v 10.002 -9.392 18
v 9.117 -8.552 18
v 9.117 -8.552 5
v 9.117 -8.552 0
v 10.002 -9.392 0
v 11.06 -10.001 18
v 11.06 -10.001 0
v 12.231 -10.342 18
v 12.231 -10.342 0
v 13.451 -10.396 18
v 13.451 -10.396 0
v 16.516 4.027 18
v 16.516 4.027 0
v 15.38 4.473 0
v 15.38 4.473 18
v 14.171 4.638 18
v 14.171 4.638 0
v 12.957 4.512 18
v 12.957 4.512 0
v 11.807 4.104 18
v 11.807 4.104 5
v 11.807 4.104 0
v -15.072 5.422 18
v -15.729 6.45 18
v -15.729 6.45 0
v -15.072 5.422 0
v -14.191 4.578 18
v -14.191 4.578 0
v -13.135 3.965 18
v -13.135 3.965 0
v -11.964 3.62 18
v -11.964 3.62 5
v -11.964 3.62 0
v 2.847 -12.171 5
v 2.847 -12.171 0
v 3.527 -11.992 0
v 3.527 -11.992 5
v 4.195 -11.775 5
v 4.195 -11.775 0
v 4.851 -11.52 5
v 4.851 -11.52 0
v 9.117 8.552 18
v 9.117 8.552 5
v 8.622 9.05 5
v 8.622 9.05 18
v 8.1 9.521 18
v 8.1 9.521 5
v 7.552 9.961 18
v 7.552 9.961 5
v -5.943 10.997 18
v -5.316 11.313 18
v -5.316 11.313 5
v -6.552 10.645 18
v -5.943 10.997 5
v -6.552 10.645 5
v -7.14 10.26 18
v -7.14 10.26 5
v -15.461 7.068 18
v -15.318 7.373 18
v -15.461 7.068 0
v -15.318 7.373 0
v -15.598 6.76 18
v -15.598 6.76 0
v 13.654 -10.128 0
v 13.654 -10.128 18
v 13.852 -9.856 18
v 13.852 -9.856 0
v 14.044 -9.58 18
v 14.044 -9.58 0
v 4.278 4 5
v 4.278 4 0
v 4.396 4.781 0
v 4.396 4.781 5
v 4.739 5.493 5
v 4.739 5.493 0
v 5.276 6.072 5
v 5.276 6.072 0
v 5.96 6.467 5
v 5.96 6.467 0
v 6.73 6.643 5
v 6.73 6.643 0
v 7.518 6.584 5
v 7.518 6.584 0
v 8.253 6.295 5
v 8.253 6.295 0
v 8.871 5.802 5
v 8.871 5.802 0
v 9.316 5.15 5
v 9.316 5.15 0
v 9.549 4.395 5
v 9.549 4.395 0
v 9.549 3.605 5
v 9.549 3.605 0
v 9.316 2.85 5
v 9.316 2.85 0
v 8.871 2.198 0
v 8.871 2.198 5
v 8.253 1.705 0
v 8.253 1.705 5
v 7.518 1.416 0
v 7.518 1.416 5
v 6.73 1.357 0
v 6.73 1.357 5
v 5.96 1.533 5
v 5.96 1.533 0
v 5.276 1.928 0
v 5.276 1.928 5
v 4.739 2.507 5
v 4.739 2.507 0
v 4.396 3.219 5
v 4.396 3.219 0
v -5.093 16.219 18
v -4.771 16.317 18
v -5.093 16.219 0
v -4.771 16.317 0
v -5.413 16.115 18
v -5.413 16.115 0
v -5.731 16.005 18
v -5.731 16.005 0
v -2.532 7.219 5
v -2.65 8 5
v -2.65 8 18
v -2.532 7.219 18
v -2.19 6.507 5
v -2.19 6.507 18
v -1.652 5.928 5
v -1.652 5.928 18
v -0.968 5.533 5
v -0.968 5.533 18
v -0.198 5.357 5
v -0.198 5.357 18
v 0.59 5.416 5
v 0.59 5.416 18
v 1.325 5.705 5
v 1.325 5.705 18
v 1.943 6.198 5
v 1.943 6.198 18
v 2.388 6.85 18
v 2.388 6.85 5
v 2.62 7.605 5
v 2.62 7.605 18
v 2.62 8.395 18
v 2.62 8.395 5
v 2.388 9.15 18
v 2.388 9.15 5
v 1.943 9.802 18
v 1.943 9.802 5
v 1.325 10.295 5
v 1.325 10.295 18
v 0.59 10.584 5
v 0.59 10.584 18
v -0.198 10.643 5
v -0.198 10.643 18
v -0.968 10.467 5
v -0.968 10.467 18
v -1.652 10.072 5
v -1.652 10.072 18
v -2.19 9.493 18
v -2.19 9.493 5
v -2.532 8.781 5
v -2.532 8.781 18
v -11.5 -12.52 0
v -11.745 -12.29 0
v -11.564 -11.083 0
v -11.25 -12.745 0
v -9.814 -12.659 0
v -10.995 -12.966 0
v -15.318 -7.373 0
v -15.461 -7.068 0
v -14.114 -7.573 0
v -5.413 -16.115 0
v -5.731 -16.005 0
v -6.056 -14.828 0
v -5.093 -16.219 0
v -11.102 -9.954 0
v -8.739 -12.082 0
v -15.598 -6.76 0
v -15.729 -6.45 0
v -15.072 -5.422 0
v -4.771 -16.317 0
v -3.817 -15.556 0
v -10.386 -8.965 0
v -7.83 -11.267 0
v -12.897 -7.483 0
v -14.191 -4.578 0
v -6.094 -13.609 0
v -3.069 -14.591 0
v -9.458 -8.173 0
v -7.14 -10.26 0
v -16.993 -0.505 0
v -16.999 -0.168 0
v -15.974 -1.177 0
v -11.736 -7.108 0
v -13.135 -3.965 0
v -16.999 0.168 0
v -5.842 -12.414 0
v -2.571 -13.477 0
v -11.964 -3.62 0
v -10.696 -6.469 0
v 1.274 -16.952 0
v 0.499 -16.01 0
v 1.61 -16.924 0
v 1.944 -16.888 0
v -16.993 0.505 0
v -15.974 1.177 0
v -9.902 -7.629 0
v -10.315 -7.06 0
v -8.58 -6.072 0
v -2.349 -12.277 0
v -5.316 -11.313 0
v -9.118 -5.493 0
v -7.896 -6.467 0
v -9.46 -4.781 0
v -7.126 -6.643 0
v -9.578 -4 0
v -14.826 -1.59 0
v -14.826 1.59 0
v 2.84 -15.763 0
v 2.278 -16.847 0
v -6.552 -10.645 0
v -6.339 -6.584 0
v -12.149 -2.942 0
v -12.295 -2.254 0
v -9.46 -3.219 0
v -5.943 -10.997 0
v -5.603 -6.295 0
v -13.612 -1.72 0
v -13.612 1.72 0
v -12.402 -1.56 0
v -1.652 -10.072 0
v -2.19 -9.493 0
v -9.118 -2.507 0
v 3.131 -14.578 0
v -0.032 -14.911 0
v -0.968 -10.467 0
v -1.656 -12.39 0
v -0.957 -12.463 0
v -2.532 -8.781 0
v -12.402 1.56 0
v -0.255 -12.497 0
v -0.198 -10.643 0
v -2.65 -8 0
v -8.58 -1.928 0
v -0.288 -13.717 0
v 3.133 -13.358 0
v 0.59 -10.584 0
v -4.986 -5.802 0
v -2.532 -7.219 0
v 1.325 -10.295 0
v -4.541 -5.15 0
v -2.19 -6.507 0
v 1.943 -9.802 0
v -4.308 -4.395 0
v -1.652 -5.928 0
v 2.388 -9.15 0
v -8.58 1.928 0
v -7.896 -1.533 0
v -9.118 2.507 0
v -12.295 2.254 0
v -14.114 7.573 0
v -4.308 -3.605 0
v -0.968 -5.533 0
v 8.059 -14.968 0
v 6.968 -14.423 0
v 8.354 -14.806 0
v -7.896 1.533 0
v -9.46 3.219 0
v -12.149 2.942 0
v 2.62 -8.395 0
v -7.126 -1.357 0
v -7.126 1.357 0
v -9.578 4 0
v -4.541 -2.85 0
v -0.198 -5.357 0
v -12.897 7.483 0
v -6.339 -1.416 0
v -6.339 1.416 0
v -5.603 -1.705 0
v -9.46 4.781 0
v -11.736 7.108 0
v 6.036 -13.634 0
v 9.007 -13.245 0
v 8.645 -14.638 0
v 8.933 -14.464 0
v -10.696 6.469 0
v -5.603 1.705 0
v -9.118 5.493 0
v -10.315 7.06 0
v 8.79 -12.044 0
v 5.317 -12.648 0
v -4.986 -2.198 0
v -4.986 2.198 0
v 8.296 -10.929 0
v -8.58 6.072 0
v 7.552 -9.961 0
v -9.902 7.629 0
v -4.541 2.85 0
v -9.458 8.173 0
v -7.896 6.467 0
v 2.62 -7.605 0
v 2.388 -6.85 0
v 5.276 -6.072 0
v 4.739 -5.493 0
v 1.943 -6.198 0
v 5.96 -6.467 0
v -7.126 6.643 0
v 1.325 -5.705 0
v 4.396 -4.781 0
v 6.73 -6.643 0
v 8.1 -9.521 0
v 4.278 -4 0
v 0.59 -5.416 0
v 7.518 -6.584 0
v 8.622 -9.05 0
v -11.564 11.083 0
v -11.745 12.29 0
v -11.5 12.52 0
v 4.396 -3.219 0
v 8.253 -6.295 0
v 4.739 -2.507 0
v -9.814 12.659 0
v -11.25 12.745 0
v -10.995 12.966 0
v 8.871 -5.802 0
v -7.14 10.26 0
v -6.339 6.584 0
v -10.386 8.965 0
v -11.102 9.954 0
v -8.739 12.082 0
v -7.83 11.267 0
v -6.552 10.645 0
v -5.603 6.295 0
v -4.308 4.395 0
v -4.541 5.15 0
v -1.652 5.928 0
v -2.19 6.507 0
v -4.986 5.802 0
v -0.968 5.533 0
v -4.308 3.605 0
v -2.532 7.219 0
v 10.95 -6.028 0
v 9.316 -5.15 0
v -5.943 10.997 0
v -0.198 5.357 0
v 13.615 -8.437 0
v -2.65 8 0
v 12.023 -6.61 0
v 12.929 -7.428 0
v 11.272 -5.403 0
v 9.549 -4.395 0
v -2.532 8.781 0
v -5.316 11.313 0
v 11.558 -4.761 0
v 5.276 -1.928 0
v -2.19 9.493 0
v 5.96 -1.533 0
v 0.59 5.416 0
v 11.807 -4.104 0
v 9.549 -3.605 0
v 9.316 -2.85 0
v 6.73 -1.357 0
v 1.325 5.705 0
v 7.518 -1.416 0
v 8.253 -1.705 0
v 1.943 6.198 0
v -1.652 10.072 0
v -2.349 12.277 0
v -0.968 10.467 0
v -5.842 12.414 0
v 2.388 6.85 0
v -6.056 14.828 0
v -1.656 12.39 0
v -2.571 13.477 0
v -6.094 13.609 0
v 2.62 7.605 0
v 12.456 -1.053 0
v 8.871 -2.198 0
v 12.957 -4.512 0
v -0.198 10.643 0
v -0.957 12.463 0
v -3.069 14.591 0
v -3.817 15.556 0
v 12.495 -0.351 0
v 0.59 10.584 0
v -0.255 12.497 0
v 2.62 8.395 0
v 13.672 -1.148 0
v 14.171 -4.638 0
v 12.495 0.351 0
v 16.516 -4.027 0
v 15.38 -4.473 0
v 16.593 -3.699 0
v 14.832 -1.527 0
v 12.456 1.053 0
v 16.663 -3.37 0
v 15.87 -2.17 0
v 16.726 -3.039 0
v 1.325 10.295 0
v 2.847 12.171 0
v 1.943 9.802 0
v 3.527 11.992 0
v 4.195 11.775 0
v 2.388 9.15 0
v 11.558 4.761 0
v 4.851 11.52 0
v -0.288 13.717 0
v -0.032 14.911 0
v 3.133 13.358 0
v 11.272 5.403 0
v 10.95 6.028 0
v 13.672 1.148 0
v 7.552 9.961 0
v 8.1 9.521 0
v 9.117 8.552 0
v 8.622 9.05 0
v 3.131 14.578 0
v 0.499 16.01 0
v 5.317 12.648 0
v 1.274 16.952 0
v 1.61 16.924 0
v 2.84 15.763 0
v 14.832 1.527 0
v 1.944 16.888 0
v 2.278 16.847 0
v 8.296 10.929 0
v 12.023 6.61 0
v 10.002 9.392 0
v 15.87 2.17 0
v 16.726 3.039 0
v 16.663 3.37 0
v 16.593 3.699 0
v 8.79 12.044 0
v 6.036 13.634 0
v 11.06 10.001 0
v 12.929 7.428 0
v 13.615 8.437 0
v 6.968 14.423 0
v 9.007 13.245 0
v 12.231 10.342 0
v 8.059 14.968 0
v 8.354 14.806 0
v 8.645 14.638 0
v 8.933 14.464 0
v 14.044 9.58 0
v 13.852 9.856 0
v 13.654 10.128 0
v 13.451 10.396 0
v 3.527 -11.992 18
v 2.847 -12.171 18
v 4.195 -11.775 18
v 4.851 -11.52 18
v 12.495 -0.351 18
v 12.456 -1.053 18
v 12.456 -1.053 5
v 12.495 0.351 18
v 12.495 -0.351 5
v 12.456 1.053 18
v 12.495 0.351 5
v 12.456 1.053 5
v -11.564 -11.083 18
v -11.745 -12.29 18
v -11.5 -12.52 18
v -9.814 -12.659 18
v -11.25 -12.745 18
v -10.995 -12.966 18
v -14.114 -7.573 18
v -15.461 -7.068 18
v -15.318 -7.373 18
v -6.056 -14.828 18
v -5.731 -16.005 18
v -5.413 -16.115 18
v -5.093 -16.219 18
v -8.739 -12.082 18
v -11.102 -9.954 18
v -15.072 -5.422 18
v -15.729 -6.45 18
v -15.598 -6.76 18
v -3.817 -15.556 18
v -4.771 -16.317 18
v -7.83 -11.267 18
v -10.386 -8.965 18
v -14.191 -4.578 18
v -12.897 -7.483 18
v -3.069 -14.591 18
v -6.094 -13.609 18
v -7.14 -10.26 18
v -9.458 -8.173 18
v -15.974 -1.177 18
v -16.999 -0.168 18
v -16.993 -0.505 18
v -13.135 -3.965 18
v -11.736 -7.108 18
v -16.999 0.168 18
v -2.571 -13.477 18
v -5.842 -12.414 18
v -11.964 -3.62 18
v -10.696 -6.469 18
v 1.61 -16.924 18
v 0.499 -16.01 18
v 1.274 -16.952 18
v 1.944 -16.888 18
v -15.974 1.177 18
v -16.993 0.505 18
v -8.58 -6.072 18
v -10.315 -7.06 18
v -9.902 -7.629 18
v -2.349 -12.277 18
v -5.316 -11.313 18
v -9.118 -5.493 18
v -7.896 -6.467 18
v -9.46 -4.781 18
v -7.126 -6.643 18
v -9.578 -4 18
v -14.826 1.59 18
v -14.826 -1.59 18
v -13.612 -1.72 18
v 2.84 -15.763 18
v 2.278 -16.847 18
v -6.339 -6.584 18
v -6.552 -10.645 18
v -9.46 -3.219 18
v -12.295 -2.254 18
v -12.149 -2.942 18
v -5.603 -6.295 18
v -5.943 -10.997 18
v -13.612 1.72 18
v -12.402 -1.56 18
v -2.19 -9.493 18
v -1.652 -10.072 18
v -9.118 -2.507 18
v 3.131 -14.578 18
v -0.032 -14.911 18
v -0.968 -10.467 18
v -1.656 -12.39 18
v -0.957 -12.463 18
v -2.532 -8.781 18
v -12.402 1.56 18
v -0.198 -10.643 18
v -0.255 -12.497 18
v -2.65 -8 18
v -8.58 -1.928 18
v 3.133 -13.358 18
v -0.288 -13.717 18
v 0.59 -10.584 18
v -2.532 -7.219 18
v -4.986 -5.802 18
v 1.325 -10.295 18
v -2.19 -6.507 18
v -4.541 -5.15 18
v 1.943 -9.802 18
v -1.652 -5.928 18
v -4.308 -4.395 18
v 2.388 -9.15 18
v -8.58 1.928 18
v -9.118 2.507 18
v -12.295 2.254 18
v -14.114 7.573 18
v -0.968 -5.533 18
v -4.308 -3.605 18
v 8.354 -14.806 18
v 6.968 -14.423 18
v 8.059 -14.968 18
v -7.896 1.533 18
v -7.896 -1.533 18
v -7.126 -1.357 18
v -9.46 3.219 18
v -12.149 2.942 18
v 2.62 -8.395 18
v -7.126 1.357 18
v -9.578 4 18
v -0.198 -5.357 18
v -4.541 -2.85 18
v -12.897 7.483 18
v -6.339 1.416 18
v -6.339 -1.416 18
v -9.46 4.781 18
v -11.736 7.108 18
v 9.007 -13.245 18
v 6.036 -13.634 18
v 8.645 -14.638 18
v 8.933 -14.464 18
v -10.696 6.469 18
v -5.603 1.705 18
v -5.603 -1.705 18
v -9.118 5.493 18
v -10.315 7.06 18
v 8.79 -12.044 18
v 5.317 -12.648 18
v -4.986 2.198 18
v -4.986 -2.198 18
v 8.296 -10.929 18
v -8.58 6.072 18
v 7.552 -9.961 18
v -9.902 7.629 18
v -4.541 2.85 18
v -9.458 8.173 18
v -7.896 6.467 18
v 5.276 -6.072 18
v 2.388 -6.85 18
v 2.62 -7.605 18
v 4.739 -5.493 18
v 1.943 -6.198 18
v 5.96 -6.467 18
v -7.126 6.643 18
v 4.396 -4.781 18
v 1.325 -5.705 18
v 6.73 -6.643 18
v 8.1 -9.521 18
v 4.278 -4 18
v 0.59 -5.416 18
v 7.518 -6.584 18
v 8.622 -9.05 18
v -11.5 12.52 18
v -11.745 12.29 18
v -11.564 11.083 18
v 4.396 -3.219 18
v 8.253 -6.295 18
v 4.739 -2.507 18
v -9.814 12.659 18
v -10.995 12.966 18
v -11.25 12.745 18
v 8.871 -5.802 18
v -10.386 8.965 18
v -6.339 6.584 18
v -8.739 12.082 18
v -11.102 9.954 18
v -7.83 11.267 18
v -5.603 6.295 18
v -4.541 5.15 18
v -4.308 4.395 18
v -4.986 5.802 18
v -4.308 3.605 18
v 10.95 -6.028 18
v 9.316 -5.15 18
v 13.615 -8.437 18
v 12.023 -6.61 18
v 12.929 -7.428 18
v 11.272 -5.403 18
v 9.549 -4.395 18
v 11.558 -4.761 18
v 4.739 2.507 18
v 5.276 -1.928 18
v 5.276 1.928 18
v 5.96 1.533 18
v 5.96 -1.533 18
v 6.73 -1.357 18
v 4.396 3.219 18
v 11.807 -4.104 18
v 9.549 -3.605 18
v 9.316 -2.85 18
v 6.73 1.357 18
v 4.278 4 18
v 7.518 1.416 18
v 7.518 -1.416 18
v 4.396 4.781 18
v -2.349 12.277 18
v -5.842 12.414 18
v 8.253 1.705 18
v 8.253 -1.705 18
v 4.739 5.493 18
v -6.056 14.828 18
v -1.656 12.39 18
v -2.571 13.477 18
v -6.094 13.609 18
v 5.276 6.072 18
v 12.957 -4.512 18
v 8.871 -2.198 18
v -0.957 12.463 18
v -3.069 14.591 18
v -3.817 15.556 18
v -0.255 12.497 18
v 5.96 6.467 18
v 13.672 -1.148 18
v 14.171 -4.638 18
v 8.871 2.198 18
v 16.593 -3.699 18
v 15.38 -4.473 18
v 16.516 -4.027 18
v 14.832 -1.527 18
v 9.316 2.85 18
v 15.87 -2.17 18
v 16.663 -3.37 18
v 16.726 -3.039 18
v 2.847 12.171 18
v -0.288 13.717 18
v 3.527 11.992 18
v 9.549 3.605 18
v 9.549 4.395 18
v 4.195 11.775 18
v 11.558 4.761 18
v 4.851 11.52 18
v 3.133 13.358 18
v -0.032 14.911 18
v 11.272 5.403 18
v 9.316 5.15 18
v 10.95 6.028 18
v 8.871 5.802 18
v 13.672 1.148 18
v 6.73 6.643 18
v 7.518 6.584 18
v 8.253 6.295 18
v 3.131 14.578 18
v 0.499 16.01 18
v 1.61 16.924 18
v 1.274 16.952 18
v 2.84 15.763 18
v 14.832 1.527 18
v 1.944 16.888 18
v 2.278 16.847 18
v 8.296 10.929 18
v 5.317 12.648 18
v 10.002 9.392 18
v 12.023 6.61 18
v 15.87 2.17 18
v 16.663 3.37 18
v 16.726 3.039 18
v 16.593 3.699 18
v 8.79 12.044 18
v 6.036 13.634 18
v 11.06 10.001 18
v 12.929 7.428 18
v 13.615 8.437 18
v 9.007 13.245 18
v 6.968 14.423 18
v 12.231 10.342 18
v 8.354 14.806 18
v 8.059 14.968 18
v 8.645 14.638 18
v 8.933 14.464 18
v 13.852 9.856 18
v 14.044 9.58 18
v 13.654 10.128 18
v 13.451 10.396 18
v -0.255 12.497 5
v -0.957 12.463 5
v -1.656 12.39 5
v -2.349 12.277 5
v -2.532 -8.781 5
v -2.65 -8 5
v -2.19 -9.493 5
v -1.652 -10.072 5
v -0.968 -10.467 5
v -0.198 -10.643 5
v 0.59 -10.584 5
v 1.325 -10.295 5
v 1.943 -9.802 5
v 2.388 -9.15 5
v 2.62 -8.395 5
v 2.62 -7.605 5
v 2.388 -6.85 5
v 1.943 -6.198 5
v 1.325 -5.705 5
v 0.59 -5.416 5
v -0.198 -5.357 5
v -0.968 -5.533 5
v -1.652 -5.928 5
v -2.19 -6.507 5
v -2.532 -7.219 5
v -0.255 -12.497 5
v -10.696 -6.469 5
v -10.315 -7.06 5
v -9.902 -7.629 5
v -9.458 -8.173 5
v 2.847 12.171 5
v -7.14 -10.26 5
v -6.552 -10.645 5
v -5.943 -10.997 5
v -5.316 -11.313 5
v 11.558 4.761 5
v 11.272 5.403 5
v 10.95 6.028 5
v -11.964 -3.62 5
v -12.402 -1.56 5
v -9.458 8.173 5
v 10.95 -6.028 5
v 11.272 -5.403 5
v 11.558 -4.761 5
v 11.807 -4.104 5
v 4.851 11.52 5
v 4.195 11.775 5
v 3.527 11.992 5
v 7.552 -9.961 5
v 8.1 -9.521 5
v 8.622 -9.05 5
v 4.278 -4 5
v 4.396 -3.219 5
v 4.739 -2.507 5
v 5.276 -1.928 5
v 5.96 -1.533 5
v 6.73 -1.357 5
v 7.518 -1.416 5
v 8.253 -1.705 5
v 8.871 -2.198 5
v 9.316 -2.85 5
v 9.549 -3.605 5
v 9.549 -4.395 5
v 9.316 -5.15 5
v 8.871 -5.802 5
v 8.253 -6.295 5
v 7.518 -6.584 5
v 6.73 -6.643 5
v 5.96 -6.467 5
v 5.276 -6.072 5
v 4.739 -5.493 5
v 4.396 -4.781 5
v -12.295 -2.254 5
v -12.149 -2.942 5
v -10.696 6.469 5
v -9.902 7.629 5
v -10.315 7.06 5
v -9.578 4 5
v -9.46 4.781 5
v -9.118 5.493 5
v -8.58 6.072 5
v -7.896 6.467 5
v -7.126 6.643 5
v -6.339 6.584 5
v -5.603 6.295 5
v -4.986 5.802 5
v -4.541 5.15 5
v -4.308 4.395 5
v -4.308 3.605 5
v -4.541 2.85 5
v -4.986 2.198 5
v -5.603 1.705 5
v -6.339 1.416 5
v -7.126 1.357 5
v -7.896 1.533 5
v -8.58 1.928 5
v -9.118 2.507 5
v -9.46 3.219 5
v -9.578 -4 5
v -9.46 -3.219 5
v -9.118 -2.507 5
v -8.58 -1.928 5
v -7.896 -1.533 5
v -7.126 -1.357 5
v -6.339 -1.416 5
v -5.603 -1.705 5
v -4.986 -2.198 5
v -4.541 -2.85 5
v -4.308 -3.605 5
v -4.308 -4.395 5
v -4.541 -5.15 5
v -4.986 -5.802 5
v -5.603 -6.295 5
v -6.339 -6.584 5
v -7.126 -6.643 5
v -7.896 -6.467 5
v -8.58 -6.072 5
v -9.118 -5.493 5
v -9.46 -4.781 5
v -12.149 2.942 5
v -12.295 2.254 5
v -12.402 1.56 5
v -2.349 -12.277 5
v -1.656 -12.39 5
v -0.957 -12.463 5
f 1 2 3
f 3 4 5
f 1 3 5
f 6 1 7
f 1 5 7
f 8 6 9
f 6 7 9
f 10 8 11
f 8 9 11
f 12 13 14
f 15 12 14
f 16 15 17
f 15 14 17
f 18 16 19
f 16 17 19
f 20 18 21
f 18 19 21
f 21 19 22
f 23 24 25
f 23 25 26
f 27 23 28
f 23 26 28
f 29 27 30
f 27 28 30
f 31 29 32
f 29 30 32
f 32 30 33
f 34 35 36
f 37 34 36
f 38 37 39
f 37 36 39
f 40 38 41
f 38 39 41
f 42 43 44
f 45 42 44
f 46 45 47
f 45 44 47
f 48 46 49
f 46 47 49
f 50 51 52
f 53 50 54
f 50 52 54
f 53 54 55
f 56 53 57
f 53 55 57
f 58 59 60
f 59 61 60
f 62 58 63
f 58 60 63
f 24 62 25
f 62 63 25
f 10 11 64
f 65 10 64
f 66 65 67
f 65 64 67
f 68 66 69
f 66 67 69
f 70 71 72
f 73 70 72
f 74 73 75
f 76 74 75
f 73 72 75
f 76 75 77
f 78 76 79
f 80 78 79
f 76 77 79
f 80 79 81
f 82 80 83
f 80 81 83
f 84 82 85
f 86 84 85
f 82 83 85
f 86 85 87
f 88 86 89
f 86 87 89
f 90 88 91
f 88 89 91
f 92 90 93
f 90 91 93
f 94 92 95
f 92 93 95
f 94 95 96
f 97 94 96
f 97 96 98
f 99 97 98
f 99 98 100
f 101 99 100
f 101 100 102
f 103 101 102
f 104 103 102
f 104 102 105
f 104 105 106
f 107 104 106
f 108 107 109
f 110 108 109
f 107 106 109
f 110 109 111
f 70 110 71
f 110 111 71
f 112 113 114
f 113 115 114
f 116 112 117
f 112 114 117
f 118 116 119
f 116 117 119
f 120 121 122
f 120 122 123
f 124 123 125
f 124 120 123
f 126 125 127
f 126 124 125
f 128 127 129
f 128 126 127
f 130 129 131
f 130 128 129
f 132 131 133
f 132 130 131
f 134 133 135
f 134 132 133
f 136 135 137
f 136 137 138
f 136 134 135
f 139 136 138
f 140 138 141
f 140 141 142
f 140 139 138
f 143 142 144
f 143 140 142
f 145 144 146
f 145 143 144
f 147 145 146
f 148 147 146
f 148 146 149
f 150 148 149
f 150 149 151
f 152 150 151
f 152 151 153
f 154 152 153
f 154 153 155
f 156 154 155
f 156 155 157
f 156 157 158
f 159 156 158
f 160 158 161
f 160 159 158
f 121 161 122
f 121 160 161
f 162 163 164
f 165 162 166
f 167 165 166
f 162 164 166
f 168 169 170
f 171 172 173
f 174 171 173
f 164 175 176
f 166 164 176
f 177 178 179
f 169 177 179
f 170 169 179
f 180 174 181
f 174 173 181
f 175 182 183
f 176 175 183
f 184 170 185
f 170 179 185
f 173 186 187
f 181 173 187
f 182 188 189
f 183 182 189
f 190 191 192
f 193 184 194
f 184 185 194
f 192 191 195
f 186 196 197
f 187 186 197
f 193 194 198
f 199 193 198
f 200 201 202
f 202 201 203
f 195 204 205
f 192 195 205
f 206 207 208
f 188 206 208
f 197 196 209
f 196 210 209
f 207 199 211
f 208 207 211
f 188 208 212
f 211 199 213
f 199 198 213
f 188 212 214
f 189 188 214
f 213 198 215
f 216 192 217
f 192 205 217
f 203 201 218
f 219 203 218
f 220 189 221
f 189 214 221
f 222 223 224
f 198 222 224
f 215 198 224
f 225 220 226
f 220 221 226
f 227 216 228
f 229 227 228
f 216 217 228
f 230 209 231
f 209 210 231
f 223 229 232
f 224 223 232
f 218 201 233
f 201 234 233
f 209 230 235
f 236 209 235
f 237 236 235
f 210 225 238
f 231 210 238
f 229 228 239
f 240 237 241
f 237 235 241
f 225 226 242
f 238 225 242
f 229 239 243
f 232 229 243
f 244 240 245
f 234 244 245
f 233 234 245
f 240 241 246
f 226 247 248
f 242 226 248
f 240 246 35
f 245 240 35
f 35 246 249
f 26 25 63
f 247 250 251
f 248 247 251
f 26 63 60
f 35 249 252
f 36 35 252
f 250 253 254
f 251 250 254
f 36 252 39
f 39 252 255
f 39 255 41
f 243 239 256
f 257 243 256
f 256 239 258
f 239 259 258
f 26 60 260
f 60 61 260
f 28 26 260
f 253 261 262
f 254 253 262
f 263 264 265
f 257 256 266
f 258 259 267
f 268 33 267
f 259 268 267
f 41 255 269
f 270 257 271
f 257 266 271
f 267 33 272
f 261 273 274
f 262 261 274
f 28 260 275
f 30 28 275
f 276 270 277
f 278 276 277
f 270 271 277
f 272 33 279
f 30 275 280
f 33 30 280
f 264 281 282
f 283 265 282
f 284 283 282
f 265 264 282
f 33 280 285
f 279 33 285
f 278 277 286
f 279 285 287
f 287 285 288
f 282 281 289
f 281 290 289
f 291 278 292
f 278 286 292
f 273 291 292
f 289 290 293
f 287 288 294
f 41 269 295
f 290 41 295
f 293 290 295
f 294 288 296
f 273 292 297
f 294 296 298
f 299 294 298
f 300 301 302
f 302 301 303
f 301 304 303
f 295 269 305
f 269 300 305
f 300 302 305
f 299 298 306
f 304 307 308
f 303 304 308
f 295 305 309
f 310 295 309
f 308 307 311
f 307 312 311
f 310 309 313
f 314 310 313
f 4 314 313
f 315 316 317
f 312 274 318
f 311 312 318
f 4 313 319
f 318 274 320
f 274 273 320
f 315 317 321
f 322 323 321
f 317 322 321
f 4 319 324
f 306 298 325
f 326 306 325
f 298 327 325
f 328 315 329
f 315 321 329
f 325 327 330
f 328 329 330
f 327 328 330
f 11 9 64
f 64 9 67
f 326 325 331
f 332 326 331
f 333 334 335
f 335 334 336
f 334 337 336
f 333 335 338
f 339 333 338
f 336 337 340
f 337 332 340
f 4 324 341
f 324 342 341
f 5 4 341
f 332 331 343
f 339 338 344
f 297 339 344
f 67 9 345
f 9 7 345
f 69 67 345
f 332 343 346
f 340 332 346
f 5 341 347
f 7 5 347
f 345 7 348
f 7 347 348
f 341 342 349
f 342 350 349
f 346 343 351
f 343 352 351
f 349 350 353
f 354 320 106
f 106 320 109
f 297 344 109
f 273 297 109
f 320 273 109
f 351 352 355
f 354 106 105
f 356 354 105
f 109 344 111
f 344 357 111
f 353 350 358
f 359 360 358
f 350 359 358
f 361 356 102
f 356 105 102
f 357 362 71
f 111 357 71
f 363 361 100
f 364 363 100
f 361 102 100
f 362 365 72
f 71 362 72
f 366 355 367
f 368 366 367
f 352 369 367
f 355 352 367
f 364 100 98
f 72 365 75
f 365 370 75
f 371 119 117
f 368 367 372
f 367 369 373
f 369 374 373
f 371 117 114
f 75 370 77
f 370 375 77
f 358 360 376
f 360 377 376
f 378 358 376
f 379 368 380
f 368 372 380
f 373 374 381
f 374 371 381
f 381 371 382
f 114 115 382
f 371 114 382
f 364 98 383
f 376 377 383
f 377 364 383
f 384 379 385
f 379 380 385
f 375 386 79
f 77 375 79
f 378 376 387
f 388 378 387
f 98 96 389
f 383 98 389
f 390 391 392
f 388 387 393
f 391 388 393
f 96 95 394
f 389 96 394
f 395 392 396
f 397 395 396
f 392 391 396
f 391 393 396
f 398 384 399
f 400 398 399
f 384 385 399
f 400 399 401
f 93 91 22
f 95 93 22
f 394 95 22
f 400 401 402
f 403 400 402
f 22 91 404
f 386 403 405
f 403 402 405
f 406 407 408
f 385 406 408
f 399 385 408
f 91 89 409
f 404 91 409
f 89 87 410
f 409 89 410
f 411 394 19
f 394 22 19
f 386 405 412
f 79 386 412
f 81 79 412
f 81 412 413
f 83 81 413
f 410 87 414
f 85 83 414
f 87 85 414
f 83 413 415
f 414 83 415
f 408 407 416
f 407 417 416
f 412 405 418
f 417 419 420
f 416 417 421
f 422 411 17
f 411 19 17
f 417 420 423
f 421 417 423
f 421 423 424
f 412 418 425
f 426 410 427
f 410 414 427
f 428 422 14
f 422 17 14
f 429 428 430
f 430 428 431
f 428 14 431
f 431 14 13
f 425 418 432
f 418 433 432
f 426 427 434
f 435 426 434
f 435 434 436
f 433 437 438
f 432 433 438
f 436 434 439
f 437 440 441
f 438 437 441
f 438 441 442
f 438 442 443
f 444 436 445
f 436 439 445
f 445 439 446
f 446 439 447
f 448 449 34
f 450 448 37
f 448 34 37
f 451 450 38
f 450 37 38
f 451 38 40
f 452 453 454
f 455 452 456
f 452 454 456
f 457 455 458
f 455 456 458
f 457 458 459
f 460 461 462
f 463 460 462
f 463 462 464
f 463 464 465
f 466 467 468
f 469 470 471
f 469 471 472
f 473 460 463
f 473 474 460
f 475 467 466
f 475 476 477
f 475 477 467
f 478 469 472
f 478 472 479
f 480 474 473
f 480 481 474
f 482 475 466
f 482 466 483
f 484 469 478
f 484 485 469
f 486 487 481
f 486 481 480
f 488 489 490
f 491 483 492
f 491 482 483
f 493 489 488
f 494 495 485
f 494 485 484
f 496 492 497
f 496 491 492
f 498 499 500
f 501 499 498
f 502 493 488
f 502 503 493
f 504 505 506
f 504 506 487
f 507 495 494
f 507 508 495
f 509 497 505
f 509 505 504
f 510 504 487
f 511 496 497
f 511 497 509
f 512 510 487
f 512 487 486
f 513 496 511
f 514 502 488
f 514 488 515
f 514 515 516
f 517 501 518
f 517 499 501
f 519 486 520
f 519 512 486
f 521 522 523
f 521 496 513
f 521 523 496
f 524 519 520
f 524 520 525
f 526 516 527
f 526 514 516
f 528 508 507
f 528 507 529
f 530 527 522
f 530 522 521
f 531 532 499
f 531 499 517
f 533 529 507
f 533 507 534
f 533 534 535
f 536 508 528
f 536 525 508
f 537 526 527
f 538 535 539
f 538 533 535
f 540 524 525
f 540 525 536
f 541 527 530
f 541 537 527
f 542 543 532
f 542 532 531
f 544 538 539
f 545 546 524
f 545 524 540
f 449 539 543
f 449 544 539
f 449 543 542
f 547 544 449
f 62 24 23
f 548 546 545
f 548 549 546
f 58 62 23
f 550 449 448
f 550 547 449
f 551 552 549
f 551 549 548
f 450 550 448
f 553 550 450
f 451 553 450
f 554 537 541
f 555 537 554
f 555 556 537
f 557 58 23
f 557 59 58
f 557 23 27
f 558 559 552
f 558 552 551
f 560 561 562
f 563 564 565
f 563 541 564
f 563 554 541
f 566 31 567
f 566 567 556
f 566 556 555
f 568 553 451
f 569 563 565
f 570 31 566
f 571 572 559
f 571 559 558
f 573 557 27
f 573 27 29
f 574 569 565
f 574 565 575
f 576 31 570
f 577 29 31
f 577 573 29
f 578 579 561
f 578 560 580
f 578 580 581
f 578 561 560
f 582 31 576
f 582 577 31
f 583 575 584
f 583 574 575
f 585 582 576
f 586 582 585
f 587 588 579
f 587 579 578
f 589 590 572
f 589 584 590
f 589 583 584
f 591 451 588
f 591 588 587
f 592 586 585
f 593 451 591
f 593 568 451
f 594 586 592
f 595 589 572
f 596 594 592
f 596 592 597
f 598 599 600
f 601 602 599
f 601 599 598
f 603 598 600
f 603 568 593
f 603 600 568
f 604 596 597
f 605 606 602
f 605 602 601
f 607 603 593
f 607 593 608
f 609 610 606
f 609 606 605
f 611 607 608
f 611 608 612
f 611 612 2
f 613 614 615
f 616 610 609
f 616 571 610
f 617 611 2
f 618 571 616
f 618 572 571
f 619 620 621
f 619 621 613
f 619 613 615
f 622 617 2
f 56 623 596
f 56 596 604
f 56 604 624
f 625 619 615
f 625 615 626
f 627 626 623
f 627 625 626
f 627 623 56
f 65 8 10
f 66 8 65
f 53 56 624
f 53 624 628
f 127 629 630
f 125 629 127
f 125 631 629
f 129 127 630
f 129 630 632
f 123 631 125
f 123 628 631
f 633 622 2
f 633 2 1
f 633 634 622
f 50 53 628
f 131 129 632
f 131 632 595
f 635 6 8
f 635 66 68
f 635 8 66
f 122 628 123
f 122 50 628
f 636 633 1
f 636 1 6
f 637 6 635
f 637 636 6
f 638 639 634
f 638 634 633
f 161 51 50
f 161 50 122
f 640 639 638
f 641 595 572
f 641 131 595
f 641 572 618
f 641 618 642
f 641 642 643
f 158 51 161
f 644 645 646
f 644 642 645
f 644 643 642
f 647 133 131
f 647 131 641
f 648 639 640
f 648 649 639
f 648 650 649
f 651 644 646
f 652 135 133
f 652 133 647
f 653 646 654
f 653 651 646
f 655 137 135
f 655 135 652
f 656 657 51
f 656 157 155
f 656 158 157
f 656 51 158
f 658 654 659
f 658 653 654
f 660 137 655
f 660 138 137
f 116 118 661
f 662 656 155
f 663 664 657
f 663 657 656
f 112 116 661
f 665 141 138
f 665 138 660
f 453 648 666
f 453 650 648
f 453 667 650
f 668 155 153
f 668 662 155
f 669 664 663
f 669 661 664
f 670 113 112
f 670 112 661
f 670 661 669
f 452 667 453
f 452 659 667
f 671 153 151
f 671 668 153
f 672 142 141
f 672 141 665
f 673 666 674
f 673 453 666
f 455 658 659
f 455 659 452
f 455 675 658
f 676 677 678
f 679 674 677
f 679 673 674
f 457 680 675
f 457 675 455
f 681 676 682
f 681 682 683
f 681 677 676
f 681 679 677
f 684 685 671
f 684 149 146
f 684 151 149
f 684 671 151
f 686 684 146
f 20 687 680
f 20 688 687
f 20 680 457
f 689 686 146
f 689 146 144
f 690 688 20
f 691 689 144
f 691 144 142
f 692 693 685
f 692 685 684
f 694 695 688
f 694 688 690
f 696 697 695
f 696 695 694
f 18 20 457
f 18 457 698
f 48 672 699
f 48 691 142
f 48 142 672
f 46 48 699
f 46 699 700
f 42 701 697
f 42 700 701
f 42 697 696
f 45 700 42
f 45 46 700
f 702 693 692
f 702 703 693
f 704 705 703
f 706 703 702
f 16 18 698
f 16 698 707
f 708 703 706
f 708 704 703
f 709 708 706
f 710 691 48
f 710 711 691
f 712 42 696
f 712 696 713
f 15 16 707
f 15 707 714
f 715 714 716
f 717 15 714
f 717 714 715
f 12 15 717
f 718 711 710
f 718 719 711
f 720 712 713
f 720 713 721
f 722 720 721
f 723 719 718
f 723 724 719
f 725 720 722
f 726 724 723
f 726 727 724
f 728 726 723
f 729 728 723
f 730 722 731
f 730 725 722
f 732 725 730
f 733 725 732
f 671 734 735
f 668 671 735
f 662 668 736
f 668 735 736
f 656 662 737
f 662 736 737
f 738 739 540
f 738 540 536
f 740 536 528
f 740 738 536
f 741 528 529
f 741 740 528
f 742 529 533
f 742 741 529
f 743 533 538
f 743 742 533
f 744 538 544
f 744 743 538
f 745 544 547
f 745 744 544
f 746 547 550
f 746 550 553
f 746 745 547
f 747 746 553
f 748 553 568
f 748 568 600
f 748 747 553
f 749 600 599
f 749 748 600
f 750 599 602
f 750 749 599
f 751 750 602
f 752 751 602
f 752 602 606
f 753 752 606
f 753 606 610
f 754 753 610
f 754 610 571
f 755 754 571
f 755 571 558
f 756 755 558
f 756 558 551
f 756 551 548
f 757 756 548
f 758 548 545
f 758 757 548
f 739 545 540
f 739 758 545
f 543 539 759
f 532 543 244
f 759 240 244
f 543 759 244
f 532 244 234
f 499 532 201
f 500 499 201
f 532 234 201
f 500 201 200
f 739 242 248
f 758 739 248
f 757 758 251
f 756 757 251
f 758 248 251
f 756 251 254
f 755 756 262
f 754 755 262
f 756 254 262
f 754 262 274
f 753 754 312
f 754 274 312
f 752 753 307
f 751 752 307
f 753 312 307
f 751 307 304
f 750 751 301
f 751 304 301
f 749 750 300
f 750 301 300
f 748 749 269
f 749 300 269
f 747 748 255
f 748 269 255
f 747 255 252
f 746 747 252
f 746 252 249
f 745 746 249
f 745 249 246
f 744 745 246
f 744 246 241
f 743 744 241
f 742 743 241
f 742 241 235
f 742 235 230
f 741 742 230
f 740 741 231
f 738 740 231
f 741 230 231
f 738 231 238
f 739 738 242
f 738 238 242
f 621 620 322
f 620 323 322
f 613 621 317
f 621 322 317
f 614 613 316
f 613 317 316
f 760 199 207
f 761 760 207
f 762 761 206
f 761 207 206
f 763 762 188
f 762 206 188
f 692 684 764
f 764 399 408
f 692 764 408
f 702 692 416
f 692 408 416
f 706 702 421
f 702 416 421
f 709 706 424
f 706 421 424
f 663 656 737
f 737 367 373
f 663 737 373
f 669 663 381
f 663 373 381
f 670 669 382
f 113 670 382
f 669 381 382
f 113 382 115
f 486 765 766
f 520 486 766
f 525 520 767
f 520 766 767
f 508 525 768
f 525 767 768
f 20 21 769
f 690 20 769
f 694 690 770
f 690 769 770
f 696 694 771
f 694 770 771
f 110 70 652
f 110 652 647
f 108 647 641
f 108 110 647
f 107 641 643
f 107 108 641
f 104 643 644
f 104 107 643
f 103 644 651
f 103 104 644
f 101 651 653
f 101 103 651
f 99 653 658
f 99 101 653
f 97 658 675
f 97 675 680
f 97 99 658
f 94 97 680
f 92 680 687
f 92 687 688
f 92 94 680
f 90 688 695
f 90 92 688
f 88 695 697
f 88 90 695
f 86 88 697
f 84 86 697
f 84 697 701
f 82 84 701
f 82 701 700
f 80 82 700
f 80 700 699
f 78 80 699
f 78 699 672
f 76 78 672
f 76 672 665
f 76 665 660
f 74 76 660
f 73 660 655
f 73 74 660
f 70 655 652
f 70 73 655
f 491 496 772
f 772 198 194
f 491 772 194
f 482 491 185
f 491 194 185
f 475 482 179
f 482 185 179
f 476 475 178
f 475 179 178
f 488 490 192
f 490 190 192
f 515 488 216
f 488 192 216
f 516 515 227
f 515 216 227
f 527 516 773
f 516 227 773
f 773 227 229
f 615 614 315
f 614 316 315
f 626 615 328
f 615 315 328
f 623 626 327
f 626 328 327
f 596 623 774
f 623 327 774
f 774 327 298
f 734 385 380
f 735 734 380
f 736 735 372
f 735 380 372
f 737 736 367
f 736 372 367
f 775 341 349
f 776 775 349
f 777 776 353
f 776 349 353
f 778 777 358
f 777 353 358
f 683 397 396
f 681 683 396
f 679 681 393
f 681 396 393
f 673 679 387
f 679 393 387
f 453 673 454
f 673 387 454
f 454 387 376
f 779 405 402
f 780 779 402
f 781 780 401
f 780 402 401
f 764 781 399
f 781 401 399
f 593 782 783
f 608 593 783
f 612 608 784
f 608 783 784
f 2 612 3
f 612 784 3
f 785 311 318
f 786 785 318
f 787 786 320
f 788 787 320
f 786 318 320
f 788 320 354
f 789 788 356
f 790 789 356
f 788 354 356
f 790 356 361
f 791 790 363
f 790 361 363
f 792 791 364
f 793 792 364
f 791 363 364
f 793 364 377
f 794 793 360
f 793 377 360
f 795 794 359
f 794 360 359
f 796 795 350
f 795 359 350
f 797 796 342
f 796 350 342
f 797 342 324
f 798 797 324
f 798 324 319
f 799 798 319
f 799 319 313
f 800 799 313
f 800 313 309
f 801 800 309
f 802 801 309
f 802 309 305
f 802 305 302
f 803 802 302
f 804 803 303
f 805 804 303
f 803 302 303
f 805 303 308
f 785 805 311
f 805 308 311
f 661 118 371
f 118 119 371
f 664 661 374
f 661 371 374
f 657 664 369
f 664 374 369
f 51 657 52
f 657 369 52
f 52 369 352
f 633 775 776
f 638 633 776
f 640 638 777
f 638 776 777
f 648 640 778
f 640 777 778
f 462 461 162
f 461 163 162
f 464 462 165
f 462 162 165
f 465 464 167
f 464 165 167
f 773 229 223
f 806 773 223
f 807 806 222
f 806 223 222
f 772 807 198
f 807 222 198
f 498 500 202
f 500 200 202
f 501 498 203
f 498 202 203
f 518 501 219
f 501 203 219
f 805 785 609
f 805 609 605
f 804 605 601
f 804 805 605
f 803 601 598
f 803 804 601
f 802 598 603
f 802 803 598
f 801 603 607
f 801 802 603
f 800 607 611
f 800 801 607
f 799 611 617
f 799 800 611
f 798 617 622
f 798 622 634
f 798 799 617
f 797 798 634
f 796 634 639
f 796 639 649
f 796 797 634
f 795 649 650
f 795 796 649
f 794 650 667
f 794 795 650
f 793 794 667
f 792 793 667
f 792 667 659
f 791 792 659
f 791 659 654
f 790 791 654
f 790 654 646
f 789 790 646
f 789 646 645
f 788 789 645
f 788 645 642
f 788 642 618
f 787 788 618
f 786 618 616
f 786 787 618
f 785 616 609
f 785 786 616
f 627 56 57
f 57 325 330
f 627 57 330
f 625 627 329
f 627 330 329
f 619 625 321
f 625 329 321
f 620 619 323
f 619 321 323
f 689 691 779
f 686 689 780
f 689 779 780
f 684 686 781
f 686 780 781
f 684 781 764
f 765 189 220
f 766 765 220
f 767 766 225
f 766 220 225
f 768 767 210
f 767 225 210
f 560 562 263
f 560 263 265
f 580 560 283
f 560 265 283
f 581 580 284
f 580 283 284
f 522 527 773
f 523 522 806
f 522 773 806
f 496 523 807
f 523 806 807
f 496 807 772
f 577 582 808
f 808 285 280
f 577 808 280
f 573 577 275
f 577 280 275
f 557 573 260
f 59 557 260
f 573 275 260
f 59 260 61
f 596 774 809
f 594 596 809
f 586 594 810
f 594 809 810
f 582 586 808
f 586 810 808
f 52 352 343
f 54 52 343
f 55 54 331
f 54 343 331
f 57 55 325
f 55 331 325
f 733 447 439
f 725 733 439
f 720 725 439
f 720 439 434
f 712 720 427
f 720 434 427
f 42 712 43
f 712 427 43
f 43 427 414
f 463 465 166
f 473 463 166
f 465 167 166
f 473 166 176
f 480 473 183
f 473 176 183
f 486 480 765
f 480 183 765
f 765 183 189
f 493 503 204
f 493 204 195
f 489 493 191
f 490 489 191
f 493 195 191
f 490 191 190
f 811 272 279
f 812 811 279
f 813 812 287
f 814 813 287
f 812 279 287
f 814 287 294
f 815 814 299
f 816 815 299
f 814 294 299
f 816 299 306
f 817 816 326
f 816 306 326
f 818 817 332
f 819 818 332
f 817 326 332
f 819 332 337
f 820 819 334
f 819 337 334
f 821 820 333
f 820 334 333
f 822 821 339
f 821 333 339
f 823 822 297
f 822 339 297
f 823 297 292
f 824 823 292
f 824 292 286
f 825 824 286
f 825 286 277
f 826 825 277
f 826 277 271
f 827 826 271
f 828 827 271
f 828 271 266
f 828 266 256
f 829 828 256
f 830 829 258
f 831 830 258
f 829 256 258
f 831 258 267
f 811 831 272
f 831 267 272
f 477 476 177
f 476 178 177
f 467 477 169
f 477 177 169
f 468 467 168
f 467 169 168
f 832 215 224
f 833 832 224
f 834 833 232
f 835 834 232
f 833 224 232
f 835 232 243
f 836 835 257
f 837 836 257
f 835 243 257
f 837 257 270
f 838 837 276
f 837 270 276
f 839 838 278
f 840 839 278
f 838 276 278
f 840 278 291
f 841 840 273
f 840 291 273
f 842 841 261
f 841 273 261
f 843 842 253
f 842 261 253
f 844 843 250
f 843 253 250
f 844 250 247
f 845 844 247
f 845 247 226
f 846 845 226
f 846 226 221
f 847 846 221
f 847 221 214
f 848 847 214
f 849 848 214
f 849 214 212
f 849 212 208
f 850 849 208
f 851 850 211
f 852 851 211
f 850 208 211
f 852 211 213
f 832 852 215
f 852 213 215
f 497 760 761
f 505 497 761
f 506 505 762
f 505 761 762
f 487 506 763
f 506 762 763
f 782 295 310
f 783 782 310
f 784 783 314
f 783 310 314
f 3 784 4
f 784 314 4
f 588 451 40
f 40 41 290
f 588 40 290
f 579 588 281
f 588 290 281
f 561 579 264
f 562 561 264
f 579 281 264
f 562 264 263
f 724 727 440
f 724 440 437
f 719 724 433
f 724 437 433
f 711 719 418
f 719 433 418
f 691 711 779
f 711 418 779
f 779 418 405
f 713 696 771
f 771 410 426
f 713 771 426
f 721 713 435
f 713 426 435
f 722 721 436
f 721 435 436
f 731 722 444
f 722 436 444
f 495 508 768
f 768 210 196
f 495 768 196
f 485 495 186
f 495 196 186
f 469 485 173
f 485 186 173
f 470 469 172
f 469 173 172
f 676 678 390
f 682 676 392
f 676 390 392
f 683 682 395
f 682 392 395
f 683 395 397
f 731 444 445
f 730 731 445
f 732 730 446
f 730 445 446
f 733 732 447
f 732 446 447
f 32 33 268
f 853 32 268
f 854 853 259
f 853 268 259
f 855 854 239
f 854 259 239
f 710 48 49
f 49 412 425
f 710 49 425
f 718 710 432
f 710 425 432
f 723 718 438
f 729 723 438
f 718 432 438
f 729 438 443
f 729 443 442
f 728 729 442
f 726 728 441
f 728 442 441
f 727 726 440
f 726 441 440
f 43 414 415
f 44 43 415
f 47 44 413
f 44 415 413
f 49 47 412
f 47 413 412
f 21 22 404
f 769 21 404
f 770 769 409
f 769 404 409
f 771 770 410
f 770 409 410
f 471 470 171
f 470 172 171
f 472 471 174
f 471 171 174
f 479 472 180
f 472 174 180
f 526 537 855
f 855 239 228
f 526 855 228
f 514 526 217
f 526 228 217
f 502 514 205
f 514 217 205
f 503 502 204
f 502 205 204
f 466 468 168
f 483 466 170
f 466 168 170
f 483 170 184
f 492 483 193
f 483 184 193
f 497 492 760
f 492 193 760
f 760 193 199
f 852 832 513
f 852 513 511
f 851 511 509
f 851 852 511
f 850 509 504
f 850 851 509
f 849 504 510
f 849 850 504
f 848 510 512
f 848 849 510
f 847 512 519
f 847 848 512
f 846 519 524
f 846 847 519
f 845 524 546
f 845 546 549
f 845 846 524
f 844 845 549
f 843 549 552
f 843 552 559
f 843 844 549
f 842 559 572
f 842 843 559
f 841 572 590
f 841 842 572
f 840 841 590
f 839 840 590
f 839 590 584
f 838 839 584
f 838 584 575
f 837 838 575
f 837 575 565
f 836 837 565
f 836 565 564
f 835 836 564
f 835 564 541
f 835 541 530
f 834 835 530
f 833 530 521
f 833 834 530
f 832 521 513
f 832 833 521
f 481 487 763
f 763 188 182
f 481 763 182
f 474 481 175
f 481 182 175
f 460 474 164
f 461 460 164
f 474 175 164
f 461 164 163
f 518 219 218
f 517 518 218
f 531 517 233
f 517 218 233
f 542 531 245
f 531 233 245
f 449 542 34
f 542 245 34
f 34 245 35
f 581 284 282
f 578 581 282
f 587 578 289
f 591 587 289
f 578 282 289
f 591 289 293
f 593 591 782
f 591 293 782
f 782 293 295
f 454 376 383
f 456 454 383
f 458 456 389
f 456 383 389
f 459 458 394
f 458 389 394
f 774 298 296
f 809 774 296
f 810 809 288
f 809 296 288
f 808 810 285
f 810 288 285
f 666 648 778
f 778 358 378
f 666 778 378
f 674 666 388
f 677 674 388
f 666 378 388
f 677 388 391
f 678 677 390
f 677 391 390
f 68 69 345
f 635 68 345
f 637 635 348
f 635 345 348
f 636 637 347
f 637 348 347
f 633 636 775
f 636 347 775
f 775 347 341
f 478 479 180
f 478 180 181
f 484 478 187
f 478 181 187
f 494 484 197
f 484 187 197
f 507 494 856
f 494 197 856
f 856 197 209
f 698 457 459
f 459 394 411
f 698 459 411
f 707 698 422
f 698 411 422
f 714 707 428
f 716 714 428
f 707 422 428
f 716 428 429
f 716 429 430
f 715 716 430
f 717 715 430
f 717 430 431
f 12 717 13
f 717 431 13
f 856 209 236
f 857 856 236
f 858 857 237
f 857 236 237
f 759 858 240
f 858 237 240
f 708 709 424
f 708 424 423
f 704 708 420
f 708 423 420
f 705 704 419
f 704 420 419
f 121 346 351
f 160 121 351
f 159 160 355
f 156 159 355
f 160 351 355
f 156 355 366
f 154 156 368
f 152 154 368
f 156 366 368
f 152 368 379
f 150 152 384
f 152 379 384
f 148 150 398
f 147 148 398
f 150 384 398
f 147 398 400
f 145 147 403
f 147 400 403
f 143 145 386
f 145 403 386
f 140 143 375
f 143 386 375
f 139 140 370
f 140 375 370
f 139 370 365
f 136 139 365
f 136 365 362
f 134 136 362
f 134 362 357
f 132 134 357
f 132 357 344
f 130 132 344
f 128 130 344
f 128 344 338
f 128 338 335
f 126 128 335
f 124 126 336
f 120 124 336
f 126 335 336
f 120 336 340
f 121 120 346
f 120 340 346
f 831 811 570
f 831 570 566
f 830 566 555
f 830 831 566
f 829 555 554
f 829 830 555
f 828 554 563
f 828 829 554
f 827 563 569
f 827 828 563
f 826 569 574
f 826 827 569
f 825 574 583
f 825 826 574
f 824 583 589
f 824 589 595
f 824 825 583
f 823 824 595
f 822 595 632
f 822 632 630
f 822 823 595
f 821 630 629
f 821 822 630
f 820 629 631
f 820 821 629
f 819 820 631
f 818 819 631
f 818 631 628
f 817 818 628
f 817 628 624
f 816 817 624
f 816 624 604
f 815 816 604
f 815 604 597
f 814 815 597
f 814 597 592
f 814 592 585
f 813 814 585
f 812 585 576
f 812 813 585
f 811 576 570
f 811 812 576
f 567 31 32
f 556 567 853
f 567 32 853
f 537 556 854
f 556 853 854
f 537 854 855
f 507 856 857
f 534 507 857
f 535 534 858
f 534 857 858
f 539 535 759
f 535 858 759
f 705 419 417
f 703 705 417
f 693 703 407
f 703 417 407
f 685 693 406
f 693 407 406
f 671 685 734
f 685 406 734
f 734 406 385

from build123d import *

# Parameters (mm, degrees)
SKETCH_1_R          = 12.5
EXTRUDE_2_DEPTH     = 5
EXTRUDE_START       = -5
EXTRUDE_4_DEPTH     = 5
SKETCH_5_R          = 2.65
CUT_EXTRUDE_1_DEPTH = 5
SKETCH_8_R          = 2.65
EXTRUDE_6_DEPTH     = 13


with BuildPart() as part:
    # 草图1 → 凸台-拉伸2 (new body)
    with BuildSketch(Plane.XY):
        Circle(SKETCH_1_R)
    extrude(amount=EXTRUDE_2_DEPTH)

    # 草图4 → 凸台-拉伸4 (add)
    with BuildSketch(Plane.XY.offset(5).offset(EXTRUDE_START)):
        with BuildLine():
            ThreePointArc((7.551754202, 9.960974273), (8.789798259, 12.044342407), (8.933409377, 14.463547176))
            ThreePointArc((8.933409377, 14.463547176), (8.5, 14.722431864), (8.059094594, 14.968333051))
            ThreePointArc((8.059094594, 14.968333051), (6.035807367, 13.63435979), (4.850579666, 11.520498119))
            ThreePointArc((4.850579666, 11.520498119), (6.25, 10.825317547), (7.551754202, 9.960974273))
        make_face()
        with BuildLine():
            ThreePointArc((10.950363986, 6.028227648), (12.928755671, 7.427921259), (14.043930183, 9.579562882))
            ThreePointArc((14.043930183, 9.579562882), (13.753288904, 9.992349289), (13.450518797, 10.396323586))
            ThreePointArc((13.450518797, 10.396323586), (11.059578134, 10.000623427), (9.117033752, 8.551590236))
            ThreePointArc((9.117033752, 8.551590236), (10.11271243, 7.347315654), (10.950363986, 6.028227648))
        make_face()
        with BuildLine():
            ThreePointArc((12.455556356, 1.053145697), (14.832213775, 1.527145045), (16.726127875, 3.039185139))
            ThreePointArc((16.726127875, 3.039185139), (16.628509212, 3.534498744), (16.516226105, 4.026695325))
            ThreePointArc((16.516226105, 4.026695325), (14.17104737, 4.637688421), (11.807069877, 4.104034712))
            ThreePointArc((11.807069877, 4.104034712), (12.226845009, 2.598896135), (12.455556356, 1.053145697))
        make_face()
        with BuildLine():
            ThreePointArc((16.516226105, -4.026695325), (16.628509212, -3.534498744), (16.726127875, -3.039185139))
            ThreePointArc((16.726127875, -3.039185139), (14.832213775, -1.527145045), (12.455556356, -1.053145697))
            ThreePointArc((12.455556356, -1.053145697), (12.226845009, -2.598896135), (11.807069877, -4.104034712))
            ThreePointArc((11.807069877, -4.104034712), (14.17104737, -4.637688421), (16.516226105, -4.026695325))
        make_face()
        with BuildLine():
            ThreePointArc((13.450518797, -10.396323586), (13.753288904, -9.992349289), (14.043930183, -9.579562882))
            ThreePointArc((14.043930183, -9.579562882), (12.928755671, -7.427921259), (10.950363986, -6.028227648))
            ThreePointArc((10.950363986, -6.028227648), (10.11271243, -7.347315654), (9.117033752, -8.551590236))
            ThreePointArc((9.117033752, -8.551590236), (11.059578134, -10.000623427), (13.450518797, -10.396323586))
        make_face()
        with BuildLine():
            ThreePointArc((8.059094594, -14.968333051), (8.5, -14.722431864), (8.933409377, -14.463547176))
            ThreePointArc((8.933409377, -14.463547176), (8.789798259, -12.044342407), (7.551754202, -9.960974273))
            ThreePointArc((7.551754202, -9.960974273), (6.25, -10.825317547), (4.850579666, -11.520498119))
            ThreePointArc((4.850579666, -11.520498119), (6.035807367, -13.63435979), (8.059094594, -14.968333051))
        make_face()
        with BuildLine():
            ThreePointArc((1.274179722, -16.952181749), (1.776983876, -16.906872221), (2.278220933, -16.846652765))
            ThreePointArc((2.278220933, -16.846652765), (3.131004874, -14.578187333), (2.847377511, -12.171377955))
            ThreePointArc((2.847377511, -12.171377955), (1.306605791, -12.431523692), (-0.25458371, -12.497407216))
            ThreePointArc((-0.25458371, -12.497407216), (-0.031609328, -14.91059148), (1.274179722, -16.952181749))
        make_face()
        with BuildLine():
            ThreePointArc((-5.7310524, -16.004844216), (-5.253288904, -16.167960777), (-4.770892608, -16.316819044))
            ThreePointArc((-4.770892608, -16.316819044), (-3.069167697, -14.591331231), (-2.34933662, -12.277239814))
            ThreePointArc((-2.34933662, -12.277239814), (-3.86271243, -11.888206454), (-5.315727251, -11.313401071))
            ThreePointArc((-5.315727251, -11.313401071), (-6.093560483, -13.608646446), (-5.7310524, -16.004844216))
        make_face()
        with BuildLine():
            ThreePointArc((-11.745333497, -12.290123719), (-11.375220308, -12.633462033), (-10.995075475, -12.965659077))
            ThreePointArc((-10.995075475, -12.965659077), (-8.738653291, -12.081501401), (-7.139829106, -10.260255374))
            ThreePointArc((-7.139829106, -10.260255374), (-8.364132579, -9.289310318), (-9.457733257, -8.173205102))
            ThreePointArc((-9.457733257, -8.173205102), (-11.101879672, -9.95364281), (-11.745333497, -12.290123719))
        make_face()
        with BuildLine():
            ThreePointArc((2.847377511, 12.171377955), (3.131004874, 14.578187333), (2.278220933, 16.846652765))
            ThreePointArc((2.278220933, 16.846652765), (1.776983876, 16.906872221), (1.274179722, 16.952181749))
            ThreePointArc((1.274179722, 16.952181749), (-0.031609328, 14.91059148), (-0.25458371, 12.497407216))
            ThreePointArc((-0.25458371, 12.497407216), (1.306605791, 12.431523692), (2.847377511, 12.171377955))
        make_face()
        with BuildLine():
            ThreePointArc((-2.34933662, 12.277239814), (-3.069167697, 14.591331231), (-4.770892608, 16.316819044))
            ThreePointArc((-4.770892608, 16.316819044), (-5.253288904, 16.167960777), (-5.7310524, 16.004844216))
            ThreePointArc((-5.7310524, 16.004844216), (-6.093560483, 13.608646446), (-5.315727251, 11.313401071))
            ThreePointArc((-5.315727251, 11.313401071), (-3.86271243, 11.888206454), (-2.34933662, 12.277239814))
        make_face()
        with BuildLine():
            ThreePointArc((-7.139829106, 10.260255374), (-8.738653291, 12.081501401), (-10.995075475, 12.965659077))
            ThreePointArc((-10.995075475, 12.965659077), (-11.375220308, 12.633462033), (-11.745333497, 12.290123719))
            ThreePointArc((-11.745333497, 12.290123719), (-11.101879672, 9.95364281), (-9.457733257, 8.173205102))
            ThreePointArc((-9.457733257, 8.173205102), (-8.364132579, 9.289310318), (-7.139829106, 10.260255374))
        make_face()
        with BuildLine():
            ThreePointArc((-10.695780276, 6.469179569), (-12.897146343, 7.482670221), (-15.318109905, 7.372618866))
            ThreePointArc((-15.318109905, 7.372618866), (-15.53027278, 6.914522932), (-15.72873973, 6.450329179))
            ThreePointArc((-15.72873973, 6.450329179), (-14.190583009, 4.577563906), (-11.964411263, 3.619787719))
            ThreePointArc((-11.964411263, 3.619787719), (-11.419318221, 5.084208038), (-10.695780276, 6.469179569))
        make_face()
        with BuildLine():
            ThreePointArc((-12.402333868, 1.559523845), (-14.825605626, 1.590017383), (-16.992503971, 0.504785875))
            ThreePointArc((-16.992503971, 0.504785875), (-17, 0), (-16.992503971, -0.504785875))
            ThreePointArc((-16.992503971, -0.504785875), (-14.825605626, -1.590017383), (-12.402333868, -1.559523845))
            ThreePointArc((-12.402333868, -1.559523845), (-12.5, 0), (-12.402333868, 1.559523845))
        make_face()
        with BuildLine():
            ThreePointArc((-15.72873973, -6.450329179), (-15.53027278, -6.914522932), (-15.318109905, -7.372618866))
            ThreePointArc((-15.318109905, -7.372618866), (-12.897146343, -7.482670221), (-10.695780276, -6.469179569))
            ThreePointArc((-10.695780276, -6.469179569), (-11.419318221, -5.084208038), (-11.964411263, -3.619787719))
            ThreePointArc((-11.964411263, -3.619787719), (-14.190583009, -4.577563906), (-15.72873973, -6.450329179))
        make_face()
    extrude(amount=EXTRUDE_4_DEPTH)

    # 草图5 → 切除-拉伸1 (cut)
    with BuildSketch(Plane(origin=(0, 0, 0), x_dir=(-1, 0, 0), z_dir=(0, 0, -1))):
        with Locations((0, 8)):
            Circle(SKETCH_5_R)
        with Locations((6.92820323, 4)):
            Circle(SKETCH_5_R)
        with Locations((6.92820323, -4)):
            Circle(SKETCH_5_R)
        with Locations((0, -8)):
            Circle(SKETCH_5_R)
        with Locations((-6.92820323, -4)):
            Circle(SKETCH_5_R)
        with Locations((-6.92820323, 4)):
            Circle(SKETCH_5_R)
    extrude(amount=-CUT_EXTRUDE_1_DEPTH, mode=Mode.SUBTRACT)

    # 草图8 → 凸台-拉伸6 (add)
    with BuildSketch(Plane.XY.offset(5)):
        with BuildLine():
            ThreePointArc((-0.25458371, 12.497407216), (-1.306605791, 12.431523692), (-2.34933662, 12.277239814))
            ThreePointArc((-2.34933662, 12.277239814), (-3.069167697, 14.591331231), (-4.770892608, 16.316819044))
            ThreePointArc((-4.770892608, 16.316819044), (-5.253288904, 16.167960777), (-5.7310524, 16.004844216))
            ThreePointArc((-5.7310524, 16.004844216), (-6.093560483, 13.608646446), (-5.315727251, 11.313401071))
            ThreePointArc((-5.315727251, 11.313401071), (-6.25, 10.825317547), (-7.139829106, 10.260255374))
            ThreePointArc((-7.139829106, 10.260255374), (-8.738653291, 12.081501401), (-10.995075475, 12.965659077))
            ThreePointArc((-10.995075475, 12.965659077), (-11.375220308, 12.633462033), (-11.745333497, 12.290123719))
            ThreePointArc((-11.745333497, 12.290123719), (-11.101879672, 9.95364281), (-9.457733257, 8.173205102))
            ThreePointArc((-9.457733257, 8.173205102), (-10.11271243, 7.347315654), (-10.695780276, 6.469179569))
            ThreePointArc((-10.695780276, 6.469179569), (-12.897146343, 7.482670221), (-15.318109905, 7.372618866))
            ThreePointArc((-15.318109905, 7.372618866), (-15.53027278, 6.914522932), (-15.72873973, 6.450329179))
            ThreePointArc((-15.72873973, 6.450329179), (-14.190583009, 4.577563906), (-11.964411263, 3.619787719))
            ThreePointArc((-11.964411263, 3.619787719), (-12.226845009, 2.598896135), (-12.402333868, 1.559523845))
            ThreePointArc((-12.402333868, 1.559523845), (-14.825605626, 1.590017383), (-16.992503971, 0.504785875))
            ThreePointArc((-16.992503971, 0.504785875), (-17, 0), (-16.992503971, -0.504785875))
            ThreePointArc((-16.992503971, -0.504785875), (-14.825605626, -1.590017383), (-12.402333868, -1.559523845))
            ThreePointArc((-12.402333868, -1.559523845), (-12.226845009, -2.598896135), (-11.964411263, -3.619787719))
            ThreePointArc((-11.964411263, -3.619787719), (-14.190583009, -4.577563906), (-15.72873973, -6.450329179))
            ThreePointArc((-15.72873973, -6.450329179), (-15.53027278, -6.914522932), (-15.318109905, -7.372618866))
            ThreePointArc((-15.318109905, -7.372618866), (-12.897146343, -7.482670221), (-10.695780276, -6.469179569))
            ThreePointArc((-10.695780276, -6.469179569), (-10.11271243, -7.347315654), (-9.457733257, -8.173205102))
            ThreePointArc((-9.457733257, -8.173205102), (-11.101879672, -9.95364281), (-11.745333497, -12.290123719))
            ThreePointArc((-11.745333497, -12.290123719), (-11.375220308, -12.633462033), (-10.995075475, -12.965659077))
            ThreePointArc((-10.995075475, -12.965659077), (-8.738653291, -12.081501401), (-7.139829106, -10.260255374))
            ThreePointArc((-7.139829106, -10.260255374), (-6.25, -10.825317547), (-5.315727251, -11.313401071))
            ThreePointArc((-5.315727251, -11.313401071), (-6.093560483, -13.608646446), (-5.7310524, -16.004844216))
            ThreePointArc((-5.7310524, -16.004844216), (-5.253288904, -16.167960777), (-4.770892608, -16.316819044))
            ThreePointArc((-4.770892608, -16.316819044), (-3.069167697, -14.591331231), (-2.34933662, -12.277239814))
            ThreePointArc((-2.34933662, -12.277239814), (-1.306605791, -12.431523692), (-0.25458371, -12.497407216))
            ThreePointArc((-0.25458371, -12.497407216), (-0.031609328, -14.91059148), (1.274179722, -16.952181749))
            ThreePointArc((1.274179722, -16.952181749), (1.776983876, -16.906872221), (2.278220933, -16.846652765))
            ThreePointArc((2.278220933, -16.846652765), (3.131004874, -14.578187333), (2.847377511, -12.171377955))
            ThreePointArc((2.847377511, -12.171377955), (3.86271243, -11.888206454), (4.850579666, -11.520498119))
            ThreePointArc((4.850579666, -11.520498119), (6.035807367, -13.63435979), (8.059094594, -14.968333051))
            ThreePointArc((8.059094594, -14.968333051), (8.5, -14.722431864), (8.933409377, -14.463547176))
            ThreePointArc((8.933409377, -14.463547176), (8.789798259, -12.044342407), (7.551754202, -9.960974273))
            ThreePointArc((7.551754202, -9.960974273), (8.364132579, -9.289310318), (9.117033752, -8.551590236))
            ThreePointArc((9.117033752, -8.551590236), (11.059578134, -10.000623427), (13.450518797, -10.396323586))
            ThreePointArc((13.450518797, -10.396323586), (13.753288904, -9.992349289), (14.043930183, -9.579562882))
            ThreePointArc((14.043930183, -9.579562882), (12.928755671, -7.427921259), (10.950363986, -6.028227648))
            ThreePointArc((10.950363986, -6.028227648), (11.419318221, -5.084208038), (11.807069877, -4.104034712))
            ThreePointArc((11.807069877, -4.104034712), (14.17104737, -4.637688421), (16.516226105, -4.026695325))
            ThreePointArc((16.516226105, -4.026695325), (16.628509212, -3.534498744), (16.726127875, -3.039185139))
            ThreePointArc((16.726127875, -3.039185139), (14.832213775, -1.527145045), (12.455556356, -1.053145697))
            ThreePointArc((12.455556356, -1.053145697), (12.5, 0), (12.455556356, 1.053145697))
            ThreePointArc((12.455556356, 1.053145697), (14.832213775, 1.527145045), (16.726127875, 3.039185139))
            ThreePointArc((16.726127875, 3.039185139), (16.628509212, 3.534498744), (16.516226105, 4.026695325))
            ThreePointArc((16.516226105, 4.026695325), (14.17104737, 4.637688421), (11.807069877, 4.104034712))
            ThreePointArc((11.807069877, 4.104034712), (11.419318221, 5.084208038), (10.950363986, 6.028227648))
            ThreePointArc((10.950363986, 6.028227648), (12.928755671, 7.427921259), (14.043930183, 9.579562882))
            ThreePointArc((14.043930183, 9.579562882), (13.753288904, 9.992349289), (13.450518797, 10.396323586))
            ThreePointArc((13.450518797, 10.396323586), (11.059578134, 10.000623427), (9.117033752, 8.551590236))
            ThreePointArc((9.117033752, 8.551590236), (8.364132579, 9.289310318), (7.551754202, 9.960974273))
            ThreePointArc((7.551754202, 9.960974273), (8.789798259, 12.044342407), (8.933409377, 14.463547176))
            ThreePointArc((8.933409377, 14.463547176), (8.5, 14.722431864), (8.059094594, 14.968333051))
            ThreePointArc((8.059094594, 14.968333051), (6.035807367, 13.63435979), (4.850579666, 11.520498119))
            ThreePointArc((4.850579666, 11.520498119), (3.86271243, 11.888206454), (2.847377511, 12.171377955))
            ThreePointArc((2.847377511, 12.171377955), (3.131004874, 14.578187333), (2.278220933, 16.846652765))
            ThreePointArc((2.278220933, 16.846652765), (1.776983876, 16.906872221), (1.274179722, 16.952181749))
            ThreePointArc((1.274179722, 16.952181749), (-0.031609328, 14.91059148), (-0.25458371, 12.497407216))
        make_face()
        with Locations(Location((6.92820323, 4, 0), (0, 0, 180))):
            Circle(SKETCH_8_R, mode=Mode.SUBTRACT)
        with Locations(Location((0, 8, 0), (0, 0, 180))):
            Circle(SKETCH_8_R, mode=Mode.SUBTRACT)
        with Locations(Location((6.92820323, -4, 0), (0, 0, 180))):
            Circle(SKETCH_8_R, mode=Mode.SUBTRACT)
        with Locations(Location((0, -8, 0), (0, 0, 180))):
            Circle(SKETCH_8_R, mode=Mode.SUBTRACT)
        with Locations(Location((-6.92820323, -4, 0), (0, 0, 180))):
            Circle(SKETCH_8_R, mode=Mode.SUBTRACT)
        with Locations(Location((-6.92820323, 4, 0), (0, 0, 180))):
            Circle(SKETCH_8_R, mode=Mode.SUBTRACT)
    extrude(amount=EXTRUDE_6_DEPTH)


solid = part.part
